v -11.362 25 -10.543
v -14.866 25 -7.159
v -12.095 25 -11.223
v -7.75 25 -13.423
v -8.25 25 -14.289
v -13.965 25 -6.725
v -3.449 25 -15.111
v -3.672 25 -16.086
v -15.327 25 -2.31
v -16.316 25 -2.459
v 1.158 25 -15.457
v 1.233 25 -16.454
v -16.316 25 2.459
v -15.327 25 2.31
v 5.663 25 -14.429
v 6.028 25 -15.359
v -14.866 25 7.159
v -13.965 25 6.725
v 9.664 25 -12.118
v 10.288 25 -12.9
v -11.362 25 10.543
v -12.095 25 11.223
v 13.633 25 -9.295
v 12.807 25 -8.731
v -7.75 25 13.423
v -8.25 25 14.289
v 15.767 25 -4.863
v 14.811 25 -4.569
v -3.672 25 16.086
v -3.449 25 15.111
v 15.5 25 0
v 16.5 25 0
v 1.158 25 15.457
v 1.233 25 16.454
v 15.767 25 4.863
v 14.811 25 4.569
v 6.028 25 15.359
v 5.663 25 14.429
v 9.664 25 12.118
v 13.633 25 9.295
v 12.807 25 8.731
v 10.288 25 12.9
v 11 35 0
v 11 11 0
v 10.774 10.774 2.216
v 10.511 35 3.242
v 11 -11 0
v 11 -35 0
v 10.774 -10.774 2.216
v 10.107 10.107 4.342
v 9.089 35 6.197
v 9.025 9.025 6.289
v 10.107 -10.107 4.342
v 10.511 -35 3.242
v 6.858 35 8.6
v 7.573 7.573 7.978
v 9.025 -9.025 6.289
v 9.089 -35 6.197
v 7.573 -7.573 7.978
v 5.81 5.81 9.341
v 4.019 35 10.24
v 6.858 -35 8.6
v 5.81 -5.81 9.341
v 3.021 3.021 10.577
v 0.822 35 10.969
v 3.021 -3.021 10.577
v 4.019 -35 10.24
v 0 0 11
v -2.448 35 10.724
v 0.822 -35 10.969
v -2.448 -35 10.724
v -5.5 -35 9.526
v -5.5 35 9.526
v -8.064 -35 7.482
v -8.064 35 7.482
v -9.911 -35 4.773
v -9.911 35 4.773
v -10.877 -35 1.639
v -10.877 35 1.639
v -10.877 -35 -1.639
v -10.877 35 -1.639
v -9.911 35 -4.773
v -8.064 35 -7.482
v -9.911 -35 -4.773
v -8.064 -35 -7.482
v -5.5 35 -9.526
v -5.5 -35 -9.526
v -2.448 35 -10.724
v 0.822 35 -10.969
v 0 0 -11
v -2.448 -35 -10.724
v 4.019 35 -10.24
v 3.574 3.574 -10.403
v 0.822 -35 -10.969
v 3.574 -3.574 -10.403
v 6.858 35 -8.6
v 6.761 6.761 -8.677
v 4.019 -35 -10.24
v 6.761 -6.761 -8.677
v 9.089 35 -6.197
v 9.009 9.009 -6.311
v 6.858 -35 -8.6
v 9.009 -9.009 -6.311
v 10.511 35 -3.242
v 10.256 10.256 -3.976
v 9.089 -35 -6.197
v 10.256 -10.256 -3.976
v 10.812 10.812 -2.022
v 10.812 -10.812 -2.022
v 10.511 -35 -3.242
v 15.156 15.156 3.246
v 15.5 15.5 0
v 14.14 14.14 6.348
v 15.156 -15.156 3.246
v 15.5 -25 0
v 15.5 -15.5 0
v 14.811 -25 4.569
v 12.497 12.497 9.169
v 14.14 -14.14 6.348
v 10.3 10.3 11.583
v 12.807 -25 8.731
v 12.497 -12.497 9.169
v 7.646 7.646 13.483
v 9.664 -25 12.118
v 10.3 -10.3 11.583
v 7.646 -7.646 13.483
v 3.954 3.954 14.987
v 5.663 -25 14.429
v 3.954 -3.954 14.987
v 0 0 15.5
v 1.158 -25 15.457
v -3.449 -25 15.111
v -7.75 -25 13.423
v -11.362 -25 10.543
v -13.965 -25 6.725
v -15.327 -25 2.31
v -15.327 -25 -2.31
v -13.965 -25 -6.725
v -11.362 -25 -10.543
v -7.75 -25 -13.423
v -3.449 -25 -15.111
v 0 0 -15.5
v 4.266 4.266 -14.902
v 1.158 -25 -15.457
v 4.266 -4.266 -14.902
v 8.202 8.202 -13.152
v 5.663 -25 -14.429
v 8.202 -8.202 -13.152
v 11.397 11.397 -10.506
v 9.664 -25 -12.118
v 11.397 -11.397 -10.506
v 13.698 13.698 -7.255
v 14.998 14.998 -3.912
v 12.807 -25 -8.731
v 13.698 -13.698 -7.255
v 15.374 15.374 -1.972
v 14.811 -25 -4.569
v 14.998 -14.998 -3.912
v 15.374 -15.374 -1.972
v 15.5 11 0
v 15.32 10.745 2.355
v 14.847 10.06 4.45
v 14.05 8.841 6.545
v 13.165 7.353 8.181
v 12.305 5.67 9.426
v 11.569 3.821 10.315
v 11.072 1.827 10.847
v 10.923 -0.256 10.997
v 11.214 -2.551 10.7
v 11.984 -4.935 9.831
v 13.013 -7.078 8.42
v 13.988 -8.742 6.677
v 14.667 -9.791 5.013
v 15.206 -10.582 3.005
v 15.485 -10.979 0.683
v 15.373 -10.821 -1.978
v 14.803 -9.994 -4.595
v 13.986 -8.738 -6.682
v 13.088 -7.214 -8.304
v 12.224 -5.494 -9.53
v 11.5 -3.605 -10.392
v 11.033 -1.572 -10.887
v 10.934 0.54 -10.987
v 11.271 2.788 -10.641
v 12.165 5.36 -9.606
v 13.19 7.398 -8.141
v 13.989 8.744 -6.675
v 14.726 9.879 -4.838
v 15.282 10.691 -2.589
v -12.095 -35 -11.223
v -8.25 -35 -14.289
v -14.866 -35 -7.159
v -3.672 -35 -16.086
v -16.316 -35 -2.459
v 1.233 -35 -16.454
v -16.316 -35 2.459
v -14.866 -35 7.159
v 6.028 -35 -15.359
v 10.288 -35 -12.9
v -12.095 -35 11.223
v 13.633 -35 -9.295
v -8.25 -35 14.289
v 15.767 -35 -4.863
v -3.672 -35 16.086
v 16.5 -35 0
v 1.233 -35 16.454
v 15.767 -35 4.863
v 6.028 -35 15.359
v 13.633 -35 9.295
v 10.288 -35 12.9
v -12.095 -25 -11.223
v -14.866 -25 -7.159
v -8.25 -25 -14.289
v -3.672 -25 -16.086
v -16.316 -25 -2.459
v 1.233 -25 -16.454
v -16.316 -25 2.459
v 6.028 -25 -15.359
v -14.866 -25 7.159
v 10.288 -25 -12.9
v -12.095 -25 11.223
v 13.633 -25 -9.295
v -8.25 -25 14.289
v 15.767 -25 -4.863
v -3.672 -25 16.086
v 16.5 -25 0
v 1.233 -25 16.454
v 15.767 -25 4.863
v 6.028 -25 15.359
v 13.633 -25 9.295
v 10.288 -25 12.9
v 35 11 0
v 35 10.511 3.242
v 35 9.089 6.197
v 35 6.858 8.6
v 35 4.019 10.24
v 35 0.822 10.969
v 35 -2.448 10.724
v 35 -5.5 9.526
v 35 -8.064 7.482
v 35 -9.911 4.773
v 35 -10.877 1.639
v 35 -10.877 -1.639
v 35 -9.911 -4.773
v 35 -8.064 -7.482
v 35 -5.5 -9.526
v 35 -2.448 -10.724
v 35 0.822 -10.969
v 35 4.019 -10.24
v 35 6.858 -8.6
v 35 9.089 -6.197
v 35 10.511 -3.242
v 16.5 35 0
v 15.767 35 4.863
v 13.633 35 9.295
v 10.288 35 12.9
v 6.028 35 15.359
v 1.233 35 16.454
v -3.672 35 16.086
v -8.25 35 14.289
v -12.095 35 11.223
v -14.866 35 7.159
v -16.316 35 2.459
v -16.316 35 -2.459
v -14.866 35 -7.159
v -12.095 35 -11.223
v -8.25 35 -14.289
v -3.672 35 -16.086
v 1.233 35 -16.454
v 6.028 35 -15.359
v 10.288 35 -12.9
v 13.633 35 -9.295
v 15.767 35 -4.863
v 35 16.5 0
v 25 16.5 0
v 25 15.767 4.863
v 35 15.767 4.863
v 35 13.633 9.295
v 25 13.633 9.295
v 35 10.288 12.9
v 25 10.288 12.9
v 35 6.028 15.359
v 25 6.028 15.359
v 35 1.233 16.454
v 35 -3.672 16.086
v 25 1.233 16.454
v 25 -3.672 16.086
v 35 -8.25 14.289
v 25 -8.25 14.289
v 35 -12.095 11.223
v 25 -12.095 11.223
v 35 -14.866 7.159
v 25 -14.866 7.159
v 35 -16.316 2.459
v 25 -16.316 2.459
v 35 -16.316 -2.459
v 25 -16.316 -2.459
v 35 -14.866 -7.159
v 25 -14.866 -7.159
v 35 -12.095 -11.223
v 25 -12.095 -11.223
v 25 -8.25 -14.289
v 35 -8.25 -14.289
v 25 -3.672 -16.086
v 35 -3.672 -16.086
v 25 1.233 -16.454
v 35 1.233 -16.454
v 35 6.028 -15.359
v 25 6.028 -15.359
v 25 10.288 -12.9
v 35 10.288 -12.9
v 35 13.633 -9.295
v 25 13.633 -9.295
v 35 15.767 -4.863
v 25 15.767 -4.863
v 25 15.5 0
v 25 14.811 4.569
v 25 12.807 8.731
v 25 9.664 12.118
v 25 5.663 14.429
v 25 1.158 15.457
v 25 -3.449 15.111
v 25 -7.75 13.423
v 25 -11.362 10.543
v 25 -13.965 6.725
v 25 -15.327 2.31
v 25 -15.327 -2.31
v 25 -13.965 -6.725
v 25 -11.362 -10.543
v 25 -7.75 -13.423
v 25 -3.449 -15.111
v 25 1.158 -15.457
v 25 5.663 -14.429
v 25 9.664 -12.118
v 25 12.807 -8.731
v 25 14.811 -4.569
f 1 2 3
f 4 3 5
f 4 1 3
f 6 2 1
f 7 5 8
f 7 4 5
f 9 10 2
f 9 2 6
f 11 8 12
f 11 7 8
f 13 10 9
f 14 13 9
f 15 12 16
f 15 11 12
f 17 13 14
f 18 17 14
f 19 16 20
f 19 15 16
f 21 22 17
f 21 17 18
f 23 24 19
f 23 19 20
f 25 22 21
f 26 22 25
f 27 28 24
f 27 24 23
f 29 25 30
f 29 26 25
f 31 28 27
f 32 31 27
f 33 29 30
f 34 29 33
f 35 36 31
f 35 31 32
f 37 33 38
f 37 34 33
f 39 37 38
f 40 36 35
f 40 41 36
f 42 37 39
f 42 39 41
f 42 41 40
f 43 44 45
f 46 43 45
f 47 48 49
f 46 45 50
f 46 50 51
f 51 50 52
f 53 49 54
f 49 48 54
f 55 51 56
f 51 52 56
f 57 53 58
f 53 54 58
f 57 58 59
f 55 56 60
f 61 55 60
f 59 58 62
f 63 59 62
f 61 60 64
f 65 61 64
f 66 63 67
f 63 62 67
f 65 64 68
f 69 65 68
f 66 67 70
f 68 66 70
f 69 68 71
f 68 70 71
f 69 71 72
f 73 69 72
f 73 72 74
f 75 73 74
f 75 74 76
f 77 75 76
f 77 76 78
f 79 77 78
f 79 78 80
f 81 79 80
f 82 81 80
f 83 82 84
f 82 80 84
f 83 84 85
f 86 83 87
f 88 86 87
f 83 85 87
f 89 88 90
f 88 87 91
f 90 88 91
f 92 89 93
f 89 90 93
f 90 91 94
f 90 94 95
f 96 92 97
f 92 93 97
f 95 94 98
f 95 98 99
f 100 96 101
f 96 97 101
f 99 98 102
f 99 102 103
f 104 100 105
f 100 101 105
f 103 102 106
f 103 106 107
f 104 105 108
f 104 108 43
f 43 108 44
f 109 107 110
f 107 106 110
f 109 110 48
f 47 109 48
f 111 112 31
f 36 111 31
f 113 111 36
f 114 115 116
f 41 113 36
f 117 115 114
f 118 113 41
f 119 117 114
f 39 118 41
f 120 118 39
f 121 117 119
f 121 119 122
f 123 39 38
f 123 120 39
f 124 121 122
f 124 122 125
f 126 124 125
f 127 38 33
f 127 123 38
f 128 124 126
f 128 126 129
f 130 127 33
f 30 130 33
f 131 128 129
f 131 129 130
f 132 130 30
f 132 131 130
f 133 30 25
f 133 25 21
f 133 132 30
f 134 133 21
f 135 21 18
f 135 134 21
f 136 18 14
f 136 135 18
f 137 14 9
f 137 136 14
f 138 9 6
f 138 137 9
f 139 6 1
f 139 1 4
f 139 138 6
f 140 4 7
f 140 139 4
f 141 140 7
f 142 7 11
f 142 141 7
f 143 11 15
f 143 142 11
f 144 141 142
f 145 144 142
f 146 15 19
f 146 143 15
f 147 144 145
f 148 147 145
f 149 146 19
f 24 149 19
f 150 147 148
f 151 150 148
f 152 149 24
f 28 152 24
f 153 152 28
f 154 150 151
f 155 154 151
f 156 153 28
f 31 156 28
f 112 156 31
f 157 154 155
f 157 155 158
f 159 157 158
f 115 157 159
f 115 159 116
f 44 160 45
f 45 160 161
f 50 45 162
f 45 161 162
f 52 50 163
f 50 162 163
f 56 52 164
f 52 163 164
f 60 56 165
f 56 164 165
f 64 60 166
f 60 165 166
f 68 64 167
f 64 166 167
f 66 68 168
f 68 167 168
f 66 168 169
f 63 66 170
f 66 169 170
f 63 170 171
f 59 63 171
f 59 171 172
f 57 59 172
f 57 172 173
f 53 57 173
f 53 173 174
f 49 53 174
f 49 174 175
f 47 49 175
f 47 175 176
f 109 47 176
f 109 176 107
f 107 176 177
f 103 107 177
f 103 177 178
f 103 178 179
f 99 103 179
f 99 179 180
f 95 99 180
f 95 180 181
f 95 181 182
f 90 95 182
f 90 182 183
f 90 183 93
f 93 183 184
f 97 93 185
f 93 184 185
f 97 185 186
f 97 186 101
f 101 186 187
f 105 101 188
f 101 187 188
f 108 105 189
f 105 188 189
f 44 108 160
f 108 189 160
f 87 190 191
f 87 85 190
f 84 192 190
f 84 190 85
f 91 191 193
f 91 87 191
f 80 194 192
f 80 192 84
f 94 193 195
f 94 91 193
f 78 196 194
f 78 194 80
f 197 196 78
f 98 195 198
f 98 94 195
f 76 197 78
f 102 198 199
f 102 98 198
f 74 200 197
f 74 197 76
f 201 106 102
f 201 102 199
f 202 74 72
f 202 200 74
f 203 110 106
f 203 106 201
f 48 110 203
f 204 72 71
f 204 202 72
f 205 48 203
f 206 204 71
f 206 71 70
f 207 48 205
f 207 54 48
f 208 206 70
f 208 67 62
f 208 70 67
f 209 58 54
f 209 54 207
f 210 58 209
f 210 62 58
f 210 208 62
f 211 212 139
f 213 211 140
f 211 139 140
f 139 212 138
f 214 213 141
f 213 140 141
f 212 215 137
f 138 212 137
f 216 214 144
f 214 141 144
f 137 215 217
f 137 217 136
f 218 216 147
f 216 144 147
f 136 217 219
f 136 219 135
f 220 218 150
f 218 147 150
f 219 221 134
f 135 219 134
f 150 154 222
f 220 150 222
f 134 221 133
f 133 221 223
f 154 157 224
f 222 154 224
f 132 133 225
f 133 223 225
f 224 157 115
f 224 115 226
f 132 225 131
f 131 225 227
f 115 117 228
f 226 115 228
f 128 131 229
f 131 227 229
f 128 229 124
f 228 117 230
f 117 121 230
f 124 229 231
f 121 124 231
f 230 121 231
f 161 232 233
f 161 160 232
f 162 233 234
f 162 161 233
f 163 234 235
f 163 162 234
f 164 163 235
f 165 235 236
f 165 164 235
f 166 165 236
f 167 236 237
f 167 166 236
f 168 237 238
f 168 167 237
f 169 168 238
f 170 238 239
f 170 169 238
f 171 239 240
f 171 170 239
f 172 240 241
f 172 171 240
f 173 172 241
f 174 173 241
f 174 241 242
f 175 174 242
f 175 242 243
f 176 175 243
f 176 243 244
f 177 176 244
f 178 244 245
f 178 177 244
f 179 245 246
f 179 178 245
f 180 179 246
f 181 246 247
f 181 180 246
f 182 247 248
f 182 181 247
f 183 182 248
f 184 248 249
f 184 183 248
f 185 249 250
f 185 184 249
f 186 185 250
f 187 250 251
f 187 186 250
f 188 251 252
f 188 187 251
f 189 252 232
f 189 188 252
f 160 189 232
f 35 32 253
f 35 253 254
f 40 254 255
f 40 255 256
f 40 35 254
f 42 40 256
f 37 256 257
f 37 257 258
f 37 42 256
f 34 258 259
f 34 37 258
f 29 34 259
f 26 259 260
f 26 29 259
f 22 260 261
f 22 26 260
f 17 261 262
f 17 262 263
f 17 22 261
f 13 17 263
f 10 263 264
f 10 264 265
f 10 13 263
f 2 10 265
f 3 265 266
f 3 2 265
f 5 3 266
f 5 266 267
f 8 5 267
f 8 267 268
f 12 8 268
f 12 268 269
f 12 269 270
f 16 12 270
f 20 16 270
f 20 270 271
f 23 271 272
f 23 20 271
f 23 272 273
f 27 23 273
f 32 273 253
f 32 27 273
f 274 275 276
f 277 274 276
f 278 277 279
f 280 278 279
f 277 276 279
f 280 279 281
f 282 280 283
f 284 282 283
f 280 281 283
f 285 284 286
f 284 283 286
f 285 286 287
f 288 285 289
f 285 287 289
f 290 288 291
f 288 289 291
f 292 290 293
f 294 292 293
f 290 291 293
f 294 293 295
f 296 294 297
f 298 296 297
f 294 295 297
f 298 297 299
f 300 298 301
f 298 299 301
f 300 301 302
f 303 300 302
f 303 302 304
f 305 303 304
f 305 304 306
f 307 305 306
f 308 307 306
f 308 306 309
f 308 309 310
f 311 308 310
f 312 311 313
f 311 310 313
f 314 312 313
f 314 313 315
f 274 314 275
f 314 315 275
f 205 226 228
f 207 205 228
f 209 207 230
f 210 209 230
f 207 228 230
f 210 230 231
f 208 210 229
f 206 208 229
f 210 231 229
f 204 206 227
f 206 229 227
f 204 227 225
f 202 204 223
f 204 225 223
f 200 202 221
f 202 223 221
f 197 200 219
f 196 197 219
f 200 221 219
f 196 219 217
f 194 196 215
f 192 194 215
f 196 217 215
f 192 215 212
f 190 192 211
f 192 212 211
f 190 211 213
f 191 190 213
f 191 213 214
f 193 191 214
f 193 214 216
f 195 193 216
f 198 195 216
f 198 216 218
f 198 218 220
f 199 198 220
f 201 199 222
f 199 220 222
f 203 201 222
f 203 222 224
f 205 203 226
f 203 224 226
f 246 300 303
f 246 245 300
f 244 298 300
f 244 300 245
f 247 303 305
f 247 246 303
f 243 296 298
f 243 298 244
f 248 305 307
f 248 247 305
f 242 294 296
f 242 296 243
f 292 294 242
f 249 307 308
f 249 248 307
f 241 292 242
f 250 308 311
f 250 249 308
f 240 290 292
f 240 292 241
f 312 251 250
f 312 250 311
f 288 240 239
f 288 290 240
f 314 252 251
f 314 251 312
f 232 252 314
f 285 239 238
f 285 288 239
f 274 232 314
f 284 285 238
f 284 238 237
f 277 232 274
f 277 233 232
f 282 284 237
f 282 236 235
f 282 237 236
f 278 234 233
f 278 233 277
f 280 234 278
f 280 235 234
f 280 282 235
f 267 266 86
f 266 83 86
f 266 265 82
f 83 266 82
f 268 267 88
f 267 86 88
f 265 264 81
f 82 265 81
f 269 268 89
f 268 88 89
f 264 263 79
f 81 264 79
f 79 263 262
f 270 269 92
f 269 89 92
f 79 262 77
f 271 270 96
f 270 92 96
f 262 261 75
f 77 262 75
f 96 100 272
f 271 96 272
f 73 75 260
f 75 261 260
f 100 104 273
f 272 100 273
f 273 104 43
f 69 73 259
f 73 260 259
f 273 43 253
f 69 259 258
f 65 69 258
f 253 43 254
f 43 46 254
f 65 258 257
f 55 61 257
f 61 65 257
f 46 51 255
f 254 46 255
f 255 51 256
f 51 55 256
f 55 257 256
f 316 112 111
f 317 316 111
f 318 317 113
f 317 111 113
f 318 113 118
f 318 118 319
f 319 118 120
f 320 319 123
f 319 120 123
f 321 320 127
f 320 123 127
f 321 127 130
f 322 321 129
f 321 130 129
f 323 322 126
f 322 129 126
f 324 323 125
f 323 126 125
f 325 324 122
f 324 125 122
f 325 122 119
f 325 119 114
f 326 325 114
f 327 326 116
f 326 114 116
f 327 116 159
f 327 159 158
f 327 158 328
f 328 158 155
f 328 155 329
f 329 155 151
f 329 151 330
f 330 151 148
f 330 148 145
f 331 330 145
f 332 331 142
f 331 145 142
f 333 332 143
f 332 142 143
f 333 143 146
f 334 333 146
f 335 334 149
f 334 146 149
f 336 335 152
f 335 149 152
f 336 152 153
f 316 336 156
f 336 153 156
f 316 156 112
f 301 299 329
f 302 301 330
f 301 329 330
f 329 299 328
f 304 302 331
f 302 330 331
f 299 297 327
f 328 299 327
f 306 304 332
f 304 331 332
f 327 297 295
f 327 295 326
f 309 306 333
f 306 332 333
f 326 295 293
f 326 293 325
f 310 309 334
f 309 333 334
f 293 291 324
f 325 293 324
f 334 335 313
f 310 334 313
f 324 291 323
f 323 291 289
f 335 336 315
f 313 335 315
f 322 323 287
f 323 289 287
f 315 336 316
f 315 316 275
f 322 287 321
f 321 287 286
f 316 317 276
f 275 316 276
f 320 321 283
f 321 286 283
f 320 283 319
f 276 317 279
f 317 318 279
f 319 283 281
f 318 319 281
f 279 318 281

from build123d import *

# Parameters (mm, degrees)
F0_R      = 15.5
F0_R_2    = 11
F1_DEPTH  = 25
F2_R      = 16.5
F2_R_2    = 11
F3_DEPTH  = 10
F5_R      = 15.5
F5_R_2    = 11
F6_DEPTH  = 25
F7_R      = 16.5
F7_R_2    = 11
F8_DEPTH  = 10
F9_R      = 11
F10_DEPTH = 200
F11_R     = 11
F12_DEPTH = 35


with BuildPart() as f1:
    # F0 (on Front) → F1 (new body)
    with BuildSketch(Plane.XZ):
        Circle(F0_R)
        Circle(F0_R_2, mode=Mode.SUBTRACT)
    extrude(amount=F1_DEPTH)

    # F2 (on face) → F3 (join)
    with BuildSketch(Plane.XZ.offset(25)):
        Circle(F2_R)
        Circle(F2_R_2, mode=Mode.SUBTRACT)
    extrude(amount=F3_DEPTH)

    # F4: F1 across plane


with BuildPart() as f1_1:
    add(f1.part)
    add(f1.part.mirror(Plane.XZ))

    # F5 (on Right) → F6 (join)
    with BuildSketch(Plane.YZ):
        Circle(F5_R)
        Circle(F5_R_2, mode=Mode.SUBTRACT)
    extrude(amount=F6_DEPTH)

    # F7 (on face) → F8 (join)
    with BuildSketch(Plane.YZ.offset(25)):
        Circle(F7_R)
        Circle(F7_R_2, mode=Mode.SUBTRACT)
    extrude(amount=F8_DEPTH)

    # F9 (on face) → F10 (cut)
    with BuildSketch(Plane.XZ.offset(35)):
        Circle(F9_R)
    extrude(amount=-F10_DEPTH, mode=Mode.SUBTRACT)

    # F11 (on face) → F12 (cut)
    with BuildSketch(Plane.YZ.offset(35)):
        Circle(F11_R)
    extrude(amount=-F12_DEPTH, mode=Mode.SUBTRACT)


solid = f1_1.part
